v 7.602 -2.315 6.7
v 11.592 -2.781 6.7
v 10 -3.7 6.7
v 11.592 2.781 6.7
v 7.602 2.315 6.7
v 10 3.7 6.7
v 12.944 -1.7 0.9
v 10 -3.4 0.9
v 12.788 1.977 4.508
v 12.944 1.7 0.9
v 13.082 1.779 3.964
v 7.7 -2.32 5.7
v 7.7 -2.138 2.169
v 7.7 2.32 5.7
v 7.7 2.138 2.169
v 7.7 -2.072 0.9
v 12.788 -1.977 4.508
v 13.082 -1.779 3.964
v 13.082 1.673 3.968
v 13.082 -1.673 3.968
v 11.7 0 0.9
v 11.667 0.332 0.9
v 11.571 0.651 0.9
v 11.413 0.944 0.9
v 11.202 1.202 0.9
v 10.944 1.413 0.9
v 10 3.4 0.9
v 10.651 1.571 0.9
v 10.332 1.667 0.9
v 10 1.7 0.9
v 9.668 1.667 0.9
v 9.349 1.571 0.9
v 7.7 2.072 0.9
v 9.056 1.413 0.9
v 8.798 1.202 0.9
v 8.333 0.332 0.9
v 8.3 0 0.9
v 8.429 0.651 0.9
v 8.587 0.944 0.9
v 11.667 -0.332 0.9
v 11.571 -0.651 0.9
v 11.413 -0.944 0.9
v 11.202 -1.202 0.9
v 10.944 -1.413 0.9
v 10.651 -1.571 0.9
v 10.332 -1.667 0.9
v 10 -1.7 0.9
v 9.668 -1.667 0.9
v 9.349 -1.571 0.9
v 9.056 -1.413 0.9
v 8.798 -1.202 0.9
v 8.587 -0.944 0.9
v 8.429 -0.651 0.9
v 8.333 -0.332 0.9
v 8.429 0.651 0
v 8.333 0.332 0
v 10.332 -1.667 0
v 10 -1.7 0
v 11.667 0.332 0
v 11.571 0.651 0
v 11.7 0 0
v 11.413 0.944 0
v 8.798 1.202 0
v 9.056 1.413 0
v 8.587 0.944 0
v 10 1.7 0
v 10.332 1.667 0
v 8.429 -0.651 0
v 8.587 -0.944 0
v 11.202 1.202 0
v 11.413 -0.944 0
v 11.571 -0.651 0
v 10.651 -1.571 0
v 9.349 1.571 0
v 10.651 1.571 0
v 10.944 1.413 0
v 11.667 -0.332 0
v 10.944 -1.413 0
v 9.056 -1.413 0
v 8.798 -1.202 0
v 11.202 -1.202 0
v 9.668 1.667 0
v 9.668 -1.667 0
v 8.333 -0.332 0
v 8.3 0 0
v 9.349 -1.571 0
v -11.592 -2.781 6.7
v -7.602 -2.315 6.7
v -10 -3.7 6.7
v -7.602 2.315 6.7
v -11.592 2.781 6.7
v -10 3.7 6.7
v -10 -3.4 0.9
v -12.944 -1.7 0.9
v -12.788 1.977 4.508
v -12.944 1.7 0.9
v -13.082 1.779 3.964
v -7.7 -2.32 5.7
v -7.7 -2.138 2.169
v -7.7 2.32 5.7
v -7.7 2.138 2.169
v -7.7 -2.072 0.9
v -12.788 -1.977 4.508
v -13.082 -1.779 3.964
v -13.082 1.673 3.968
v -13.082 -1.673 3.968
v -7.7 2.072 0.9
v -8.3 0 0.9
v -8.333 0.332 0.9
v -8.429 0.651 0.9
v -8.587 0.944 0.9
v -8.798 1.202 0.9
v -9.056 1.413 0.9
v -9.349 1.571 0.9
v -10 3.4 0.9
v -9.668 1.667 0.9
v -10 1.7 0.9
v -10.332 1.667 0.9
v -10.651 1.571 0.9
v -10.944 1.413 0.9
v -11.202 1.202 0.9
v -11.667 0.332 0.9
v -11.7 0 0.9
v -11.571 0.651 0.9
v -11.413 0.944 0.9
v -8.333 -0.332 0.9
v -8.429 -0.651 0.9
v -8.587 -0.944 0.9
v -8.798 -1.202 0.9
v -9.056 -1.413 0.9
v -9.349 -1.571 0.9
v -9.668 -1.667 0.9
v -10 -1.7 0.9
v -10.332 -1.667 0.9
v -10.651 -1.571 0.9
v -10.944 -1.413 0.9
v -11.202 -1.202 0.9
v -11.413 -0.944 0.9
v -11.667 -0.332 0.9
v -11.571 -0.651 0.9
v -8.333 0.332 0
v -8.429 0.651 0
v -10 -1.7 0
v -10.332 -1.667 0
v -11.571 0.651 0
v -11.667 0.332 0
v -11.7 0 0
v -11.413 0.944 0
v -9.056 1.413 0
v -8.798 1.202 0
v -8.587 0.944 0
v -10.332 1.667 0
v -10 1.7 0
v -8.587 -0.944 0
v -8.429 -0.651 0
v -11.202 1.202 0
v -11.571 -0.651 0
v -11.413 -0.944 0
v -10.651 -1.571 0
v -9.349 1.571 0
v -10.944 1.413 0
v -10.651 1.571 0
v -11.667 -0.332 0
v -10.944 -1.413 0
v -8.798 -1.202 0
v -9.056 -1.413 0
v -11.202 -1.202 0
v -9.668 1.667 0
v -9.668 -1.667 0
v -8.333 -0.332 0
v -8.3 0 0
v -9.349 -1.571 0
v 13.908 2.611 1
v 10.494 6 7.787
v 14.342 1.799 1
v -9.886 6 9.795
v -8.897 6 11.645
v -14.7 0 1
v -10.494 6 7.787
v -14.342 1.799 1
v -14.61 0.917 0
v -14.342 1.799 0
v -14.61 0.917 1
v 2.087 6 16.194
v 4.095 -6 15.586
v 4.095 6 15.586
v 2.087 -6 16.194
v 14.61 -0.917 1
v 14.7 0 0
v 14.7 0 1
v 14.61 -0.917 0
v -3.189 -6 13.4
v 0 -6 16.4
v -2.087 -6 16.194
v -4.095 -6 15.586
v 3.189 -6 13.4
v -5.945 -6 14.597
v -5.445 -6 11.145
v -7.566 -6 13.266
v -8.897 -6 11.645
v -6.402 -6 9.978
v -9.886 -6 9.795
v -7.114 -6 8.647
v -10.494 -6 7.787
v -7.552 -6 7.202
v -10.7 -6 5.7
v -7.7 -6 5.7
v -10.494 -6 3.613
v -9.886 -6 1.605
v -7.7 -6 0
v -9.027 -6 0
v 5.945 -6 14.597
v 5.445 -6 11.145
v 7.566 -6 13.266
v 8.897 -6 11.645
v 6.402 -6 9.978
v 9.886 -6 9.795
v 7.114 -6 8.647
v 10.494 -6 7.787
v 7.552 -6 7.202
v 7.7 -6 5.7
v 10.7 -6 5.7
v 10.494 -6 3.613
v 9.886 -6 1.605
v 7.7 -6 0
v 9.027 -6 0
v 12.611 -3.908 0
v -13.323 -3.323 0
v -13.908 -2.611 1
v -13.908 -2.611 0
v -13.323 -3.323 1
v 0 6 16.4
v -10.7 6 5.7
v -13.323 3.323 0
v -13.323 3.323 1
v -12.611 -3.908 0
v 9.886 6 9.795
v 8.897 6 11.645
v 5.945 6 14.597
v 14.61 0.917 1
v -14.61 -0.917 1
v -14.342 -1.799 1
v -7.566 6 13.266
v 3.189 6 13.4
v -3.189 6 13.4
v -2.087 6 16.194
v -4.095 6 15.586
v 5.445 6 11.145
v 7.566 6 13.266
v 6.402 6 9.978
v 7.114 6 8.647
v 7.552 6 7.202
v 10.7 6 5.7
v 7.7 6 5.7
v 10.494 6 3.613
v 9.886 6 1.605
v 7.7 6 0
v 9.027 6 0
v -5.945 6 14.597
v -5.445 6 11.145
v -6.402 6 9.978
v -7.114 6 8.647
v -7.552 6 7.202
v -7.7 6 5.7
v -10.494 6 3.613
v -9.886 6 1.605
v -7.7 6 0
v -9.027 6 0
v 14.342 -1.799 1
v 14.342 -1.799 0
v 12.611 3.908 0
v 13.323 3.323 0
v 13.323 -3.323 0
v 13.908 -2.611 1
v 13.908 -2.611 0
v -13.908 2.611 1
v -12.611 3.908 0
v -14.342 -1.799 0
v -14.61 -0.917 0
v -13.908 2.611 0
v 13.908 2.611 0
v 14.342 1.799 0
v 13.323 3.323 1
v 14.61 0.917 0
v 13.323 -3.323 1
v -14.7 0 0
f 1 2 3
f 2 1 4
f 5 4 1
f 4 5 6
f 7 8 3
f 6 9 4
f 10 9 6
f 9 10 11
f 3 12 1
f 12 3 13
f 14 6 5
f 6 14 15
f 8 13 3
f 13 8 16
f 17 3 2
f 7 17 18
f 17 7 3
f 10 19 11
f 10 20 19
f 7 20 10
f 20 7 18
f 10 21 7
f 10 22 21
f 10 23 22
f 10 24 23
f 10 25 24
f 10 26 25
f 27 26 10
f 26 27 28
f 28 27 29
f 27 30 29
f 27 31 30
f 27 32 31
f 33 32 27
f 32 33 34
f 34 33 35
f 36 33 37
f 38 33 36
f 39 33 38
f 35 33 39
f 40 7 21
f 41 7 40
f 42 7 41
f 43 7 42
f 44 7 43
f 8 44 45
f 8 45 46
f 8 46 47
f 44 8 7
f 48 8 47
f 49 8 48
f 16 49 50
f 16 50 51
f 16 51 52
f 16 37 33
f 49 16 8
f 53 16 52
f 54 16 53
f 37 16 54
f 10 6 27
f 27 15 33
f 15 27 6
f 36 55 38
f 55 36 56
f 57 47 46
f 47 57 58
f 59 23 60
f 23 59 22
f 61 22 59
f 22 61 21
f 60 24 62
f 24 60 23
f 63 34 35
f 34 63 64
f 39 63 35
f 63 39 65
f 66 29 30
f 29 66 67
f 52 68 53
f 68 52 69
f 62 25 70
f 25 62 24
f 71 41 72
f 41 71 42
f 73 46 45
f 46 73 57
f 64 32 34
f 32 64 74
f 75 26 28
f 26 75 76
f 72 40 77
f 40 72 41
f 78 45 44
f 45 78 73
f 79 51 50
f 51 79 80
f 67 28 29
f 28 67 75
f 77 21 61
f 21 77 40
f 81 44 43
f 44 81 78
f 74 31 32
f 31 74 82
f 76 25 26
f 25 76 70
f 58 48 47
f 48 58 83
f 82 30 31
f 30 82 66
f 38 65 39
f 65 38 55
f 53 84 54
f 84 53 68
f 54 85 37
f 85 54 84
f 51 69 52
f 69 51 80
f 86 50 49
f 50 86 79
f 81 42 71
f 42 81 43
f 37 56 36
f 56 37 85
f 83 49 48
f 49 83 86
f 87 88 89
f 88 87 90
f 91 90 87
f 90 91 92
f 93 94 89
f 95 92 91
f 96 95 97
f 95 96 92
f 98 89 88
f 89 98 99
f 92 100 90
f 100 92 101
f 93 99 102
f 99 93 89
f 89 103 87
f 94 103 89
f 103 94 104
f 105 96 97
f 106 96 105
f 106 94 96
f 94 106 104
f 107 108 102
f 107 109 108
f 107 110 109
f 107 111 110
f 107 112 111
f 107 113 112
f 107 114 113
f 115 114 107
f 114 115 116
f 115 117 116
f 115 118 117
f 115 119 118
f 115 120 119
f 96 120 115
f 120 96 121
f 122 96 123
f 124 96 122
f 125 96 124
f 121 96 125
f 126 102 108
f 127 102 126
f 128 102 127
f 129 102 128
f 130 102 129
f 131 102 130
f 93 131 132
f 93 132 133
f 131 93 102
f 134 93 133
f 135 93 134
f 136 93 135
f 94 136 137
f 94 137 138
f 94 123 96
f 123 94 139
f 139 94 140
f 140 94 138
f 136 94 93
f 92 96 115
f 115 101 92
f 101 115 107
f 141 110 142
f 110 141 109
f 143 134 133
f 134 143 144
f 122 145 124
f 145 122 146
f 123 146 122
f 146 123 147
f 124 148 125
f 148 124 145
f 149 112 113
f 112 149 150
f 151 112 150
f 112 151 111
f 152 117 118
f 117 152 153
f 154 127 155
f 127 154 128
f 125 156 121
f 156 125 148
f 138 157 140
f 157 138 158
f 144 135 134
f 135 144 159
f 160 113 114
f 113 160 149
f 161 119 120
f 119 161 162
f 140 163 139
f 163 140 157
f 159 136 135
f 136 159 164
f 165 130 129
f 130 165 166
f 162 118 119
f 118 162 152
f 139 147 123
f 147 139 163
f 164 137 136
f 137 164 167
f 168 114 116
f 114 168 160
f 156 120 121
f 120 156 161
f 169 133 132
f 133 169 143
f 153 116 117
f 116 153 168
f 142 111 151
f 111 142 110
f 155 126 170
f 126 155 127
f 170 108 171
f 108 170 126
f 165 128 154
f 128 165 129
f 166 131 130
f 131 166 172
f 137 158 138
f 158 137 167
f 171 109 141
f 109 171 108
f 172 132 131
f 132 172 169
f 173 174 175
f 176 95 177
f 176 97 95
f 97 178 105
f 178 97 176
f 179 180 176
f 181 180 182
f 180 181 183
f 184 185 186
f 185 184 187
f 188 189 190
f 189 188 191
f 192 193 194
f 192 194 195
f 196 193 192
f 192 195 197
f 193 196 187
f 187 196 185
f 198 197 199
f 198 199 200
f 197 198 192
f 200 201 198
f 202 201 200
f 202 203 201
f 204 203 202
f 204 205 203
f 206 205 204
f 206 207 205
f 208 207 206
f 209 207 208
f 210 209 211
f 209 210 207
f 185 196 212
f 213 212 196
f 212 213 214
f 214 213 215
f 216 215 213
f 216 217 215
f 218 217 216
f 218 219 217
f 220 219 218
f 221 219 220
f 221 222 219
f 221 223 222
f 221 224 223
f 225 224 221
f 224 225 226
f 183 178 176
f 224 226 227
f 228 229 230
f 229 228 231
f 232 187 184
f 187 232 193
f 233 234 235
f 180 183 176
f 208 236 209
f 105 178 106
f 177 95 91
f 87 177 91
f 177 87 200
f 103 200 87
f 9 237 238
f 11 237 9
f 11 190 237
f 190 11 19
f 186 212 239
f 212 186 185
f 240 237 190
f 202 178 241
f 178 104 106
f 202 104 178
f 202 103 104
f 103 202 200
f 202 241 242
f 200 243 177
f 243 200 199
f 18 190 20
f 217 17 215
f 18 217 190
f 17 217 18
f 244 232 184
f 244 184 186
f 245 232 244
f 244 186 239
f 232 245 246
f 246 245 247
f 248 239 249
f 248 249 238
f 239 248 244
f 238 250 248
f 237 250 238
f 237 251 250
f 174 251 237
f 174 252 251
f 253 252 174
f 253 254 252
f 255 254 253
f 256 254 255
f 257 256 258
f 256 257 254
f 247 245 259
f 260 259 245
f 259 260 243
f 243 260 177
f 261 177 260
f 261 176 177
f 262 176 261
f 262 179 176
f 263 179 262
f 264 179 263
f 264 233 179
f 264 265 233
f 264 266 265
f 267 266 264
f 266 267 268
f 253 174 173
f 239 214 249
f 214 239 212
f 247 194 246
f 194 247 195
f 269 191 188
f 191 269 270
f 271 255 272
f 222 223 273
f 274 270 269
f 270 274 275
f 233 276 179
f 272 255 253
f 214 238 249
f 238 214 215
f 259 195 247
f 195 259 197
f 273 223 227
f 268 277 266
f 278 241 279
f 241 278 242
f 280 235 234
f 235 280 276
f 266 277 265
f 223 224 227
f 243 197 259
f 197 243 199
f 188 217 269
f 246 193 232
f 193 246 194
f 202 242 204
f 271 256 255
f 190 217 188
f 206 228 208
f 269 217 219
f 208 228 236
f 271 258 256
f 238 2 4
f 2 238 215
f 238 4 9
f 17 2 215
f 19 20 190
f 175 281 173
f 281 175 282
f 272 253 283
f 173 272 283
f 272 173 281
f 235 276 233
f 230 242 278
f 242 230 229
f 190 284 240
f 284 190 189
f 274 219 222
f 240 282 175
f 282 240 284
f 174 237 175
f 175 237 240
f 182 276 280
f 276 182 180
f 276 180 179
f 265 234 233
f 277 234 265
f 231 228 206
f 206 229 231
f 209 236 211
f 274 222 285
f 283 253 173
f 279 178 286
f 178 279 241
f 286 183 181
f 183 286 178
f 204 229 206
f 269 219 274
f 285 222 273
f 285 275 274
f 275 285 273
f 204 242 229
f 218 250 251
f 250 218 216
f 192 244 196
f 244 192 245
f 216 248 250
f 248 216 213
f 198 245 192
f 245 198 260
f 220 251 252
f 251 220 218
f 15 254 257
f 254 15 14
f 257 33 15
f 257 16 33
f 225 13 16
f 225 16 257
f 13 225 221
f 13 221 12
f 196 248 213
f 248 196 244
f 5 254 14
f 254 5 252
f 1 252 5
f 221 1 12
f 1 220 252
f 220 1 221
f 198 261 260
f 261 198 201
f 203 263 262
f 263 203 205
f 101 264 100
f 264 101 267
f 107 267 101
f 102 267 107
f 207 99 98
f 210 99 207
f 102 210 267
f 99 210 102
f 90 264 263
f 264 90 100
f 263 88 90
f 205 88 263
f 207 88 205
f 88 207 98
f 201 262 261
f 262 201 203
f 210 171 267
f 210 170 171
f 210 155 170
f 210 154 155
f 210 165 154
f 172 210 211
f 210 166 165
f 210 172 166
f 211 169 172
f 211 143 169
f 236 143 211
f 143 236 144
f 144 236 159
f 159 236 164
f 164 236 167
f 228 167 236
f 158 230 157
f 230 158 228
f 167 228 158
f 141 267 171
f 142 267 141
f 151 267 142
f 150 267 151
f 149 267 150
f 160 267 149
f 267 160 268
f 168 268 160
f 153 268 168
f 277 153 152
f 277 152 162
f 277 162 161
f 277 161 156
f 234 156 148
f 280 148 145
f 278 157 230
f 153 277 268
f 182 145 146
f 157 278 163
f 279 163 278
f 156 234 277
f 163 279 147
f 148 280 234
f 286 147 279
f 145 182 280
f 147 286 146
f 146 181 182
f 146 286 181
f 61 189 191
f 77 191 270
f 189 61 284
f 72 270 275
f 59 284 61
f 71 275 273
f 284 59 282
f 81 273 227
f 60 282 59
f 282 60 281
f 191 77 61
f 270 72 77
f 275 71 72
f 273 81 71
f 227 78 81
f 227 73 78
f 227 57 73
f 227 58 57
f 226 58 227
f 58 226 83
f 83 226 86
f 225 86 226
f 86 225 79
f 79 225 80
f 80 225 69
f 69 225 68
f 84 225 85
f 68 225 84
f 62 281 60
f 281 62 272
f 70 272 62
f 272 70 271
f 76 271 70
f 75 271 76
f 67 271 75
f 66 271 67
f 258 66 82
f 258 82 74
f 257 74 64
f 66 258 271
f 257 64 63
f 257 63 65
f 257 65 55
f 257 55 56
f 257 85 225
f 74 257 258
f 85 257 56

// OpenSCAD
slop = .2;

m3_dia = 3;
m3_rad = m3_dia/2+slop;

m3_cap_dia = 5.7;
m3_cap_rad = m3_cap_dia/2+slop;
m3_cap_thick = 1.65+slop/2;
m3_cap_hex_rad = (2/cos(30))/2;

m3_nut_dia = 6.5;
m3_nut_rad = m3_nut_dia/2+slop;
m3_nut_thick = 2.4;

m3_clamp_len = 1;
echo("Screw Len", (m3_clamp_len+m3_nut_thick+6.4));

lm8uu_dia = 15;
lm8uu_rad = lm8uu_dia/2+slop;
lm8uu_len = 24+slop;

lm8uu_inset = 2;  //inset into frame

wall = 3;
width = 12;
hole_sep = 20;

$fn=32;

!bearing_clamp();

*nut_trap();

module bearing_clamp(){
	difference(){
		hull(){
			rotate([-90,0,0]) translate([0,lm8uu_inset-lm8uu_rad,0]) cylinder(r=lm8uu_rad+wall, h=width, center=true);

			for(i=[0,1]) mirror([i,0,0]) translate([hole_sep/2,0,0]) cylinder(r=m3_rad+wall, h=m3_clamp_len);
		}

		//bearing
		rotate([-90,0,0]) hull(){
			translate([0,lm8uu_inset-lm8uu_rad,0]) cap_cylinder(r=lm8uu_rad, h=lm8uu_len, center=true);
			cap_cylinder(r=lm8uu_rad, h=lm8uu_len, center=true);
		}

		%translate([0,0,-lm8uu_inset+lm8uu_rad]) rotate([-90,0,0]) cylinder(r=lm8uu_rad, h=lm8uu_len, center=true);

		//nutholes
		for(i=[0,1]) mirror([i,0,0]) translate([hole_sep/2,0,-.1]) {
			translate([0,0,m3_clamp_len]) hull(){
				rotate([0,0,30]) cylinder(r1=m3_nut_rad-.05, r2=m3_nut_rad+.25, h=m3_nut_thick+slop*2+wall, $fn=6);
				%rotate([0,0,30]) cylinder(r=m3_nut_rad-.05, h=m3_nut_thick, $fn=6);
				//translate([5,0,0]) cylinder(r=m3_nut_rad+.25, h=m3_nut_thick+slop*3, $fn=6);
			}
			
			cylinder(r=m3_rad, h=m3_clamp_len+m3_nut_thick);
		}

		translate([0,0,-50]) cube([100,100,100], center=true); 
	}
}

module nut_trap(){
	difference(){
		hull(){
			for(i=[0,1]) mirror([i,0,0]) translate([hole_sep/2,0,0]) cylinder(r=m3_rad+wall, h=1+m3_nut_thick);
		}

		//screwholes
		for(i=[0,1]) mirror([i,0,0]) translate([hole_sep/2,0,-.1]) {
			cylinder(r=m3_rad, h=wall+.1);
			translate([0,0,1]) cylinder(r=m3_nut_rad, h=lm8uu_dia, $fn=6);
		}

		translate([0,0,-50]) cube([100,100,100], center=true); 
	}
}

module cap_screw(len = 10){
	color([.25,.25,.25])
	difference(){
		union(){
			translate([0,0,-len/2]) rotate([0,0,-90]) cap_cylinder(r=screw_rad, h=len, center=true);
			translate([0,0,len/2-.1]) difference(){
				scale([1,1,.75]) sphere(r=cap_rad);
				translate([0,0,-cap_dia/2]) cube([cap_dia+1, cap_dia+1, cap_dia],center=true);
				translate([0,0,cap_dia/2+.1+cap_thick]) cube([cap_dia+1, cap_dia+1, cap_dia],center=true);
			}
		}
		
		translate([0,0,len/2+slop]) cylinder(r=cap_hex_rad, h=cap_thick, $fn=6);
	}
}

module cap_cylinder(r=1, h=1, center=false){
	cylinder(r=r, h=h, center=center);
	intersection(){
		rotate([0,0,22.5]) cylinder(r=r/cos(180/8), h=h, $fn=8, center=center);
		translate([0,-r/cos(180/4),0]) rotate([0,0,0]) cylinder(r=r/cos(180/4), h=h, $fn=4, center=center);
	}
}
